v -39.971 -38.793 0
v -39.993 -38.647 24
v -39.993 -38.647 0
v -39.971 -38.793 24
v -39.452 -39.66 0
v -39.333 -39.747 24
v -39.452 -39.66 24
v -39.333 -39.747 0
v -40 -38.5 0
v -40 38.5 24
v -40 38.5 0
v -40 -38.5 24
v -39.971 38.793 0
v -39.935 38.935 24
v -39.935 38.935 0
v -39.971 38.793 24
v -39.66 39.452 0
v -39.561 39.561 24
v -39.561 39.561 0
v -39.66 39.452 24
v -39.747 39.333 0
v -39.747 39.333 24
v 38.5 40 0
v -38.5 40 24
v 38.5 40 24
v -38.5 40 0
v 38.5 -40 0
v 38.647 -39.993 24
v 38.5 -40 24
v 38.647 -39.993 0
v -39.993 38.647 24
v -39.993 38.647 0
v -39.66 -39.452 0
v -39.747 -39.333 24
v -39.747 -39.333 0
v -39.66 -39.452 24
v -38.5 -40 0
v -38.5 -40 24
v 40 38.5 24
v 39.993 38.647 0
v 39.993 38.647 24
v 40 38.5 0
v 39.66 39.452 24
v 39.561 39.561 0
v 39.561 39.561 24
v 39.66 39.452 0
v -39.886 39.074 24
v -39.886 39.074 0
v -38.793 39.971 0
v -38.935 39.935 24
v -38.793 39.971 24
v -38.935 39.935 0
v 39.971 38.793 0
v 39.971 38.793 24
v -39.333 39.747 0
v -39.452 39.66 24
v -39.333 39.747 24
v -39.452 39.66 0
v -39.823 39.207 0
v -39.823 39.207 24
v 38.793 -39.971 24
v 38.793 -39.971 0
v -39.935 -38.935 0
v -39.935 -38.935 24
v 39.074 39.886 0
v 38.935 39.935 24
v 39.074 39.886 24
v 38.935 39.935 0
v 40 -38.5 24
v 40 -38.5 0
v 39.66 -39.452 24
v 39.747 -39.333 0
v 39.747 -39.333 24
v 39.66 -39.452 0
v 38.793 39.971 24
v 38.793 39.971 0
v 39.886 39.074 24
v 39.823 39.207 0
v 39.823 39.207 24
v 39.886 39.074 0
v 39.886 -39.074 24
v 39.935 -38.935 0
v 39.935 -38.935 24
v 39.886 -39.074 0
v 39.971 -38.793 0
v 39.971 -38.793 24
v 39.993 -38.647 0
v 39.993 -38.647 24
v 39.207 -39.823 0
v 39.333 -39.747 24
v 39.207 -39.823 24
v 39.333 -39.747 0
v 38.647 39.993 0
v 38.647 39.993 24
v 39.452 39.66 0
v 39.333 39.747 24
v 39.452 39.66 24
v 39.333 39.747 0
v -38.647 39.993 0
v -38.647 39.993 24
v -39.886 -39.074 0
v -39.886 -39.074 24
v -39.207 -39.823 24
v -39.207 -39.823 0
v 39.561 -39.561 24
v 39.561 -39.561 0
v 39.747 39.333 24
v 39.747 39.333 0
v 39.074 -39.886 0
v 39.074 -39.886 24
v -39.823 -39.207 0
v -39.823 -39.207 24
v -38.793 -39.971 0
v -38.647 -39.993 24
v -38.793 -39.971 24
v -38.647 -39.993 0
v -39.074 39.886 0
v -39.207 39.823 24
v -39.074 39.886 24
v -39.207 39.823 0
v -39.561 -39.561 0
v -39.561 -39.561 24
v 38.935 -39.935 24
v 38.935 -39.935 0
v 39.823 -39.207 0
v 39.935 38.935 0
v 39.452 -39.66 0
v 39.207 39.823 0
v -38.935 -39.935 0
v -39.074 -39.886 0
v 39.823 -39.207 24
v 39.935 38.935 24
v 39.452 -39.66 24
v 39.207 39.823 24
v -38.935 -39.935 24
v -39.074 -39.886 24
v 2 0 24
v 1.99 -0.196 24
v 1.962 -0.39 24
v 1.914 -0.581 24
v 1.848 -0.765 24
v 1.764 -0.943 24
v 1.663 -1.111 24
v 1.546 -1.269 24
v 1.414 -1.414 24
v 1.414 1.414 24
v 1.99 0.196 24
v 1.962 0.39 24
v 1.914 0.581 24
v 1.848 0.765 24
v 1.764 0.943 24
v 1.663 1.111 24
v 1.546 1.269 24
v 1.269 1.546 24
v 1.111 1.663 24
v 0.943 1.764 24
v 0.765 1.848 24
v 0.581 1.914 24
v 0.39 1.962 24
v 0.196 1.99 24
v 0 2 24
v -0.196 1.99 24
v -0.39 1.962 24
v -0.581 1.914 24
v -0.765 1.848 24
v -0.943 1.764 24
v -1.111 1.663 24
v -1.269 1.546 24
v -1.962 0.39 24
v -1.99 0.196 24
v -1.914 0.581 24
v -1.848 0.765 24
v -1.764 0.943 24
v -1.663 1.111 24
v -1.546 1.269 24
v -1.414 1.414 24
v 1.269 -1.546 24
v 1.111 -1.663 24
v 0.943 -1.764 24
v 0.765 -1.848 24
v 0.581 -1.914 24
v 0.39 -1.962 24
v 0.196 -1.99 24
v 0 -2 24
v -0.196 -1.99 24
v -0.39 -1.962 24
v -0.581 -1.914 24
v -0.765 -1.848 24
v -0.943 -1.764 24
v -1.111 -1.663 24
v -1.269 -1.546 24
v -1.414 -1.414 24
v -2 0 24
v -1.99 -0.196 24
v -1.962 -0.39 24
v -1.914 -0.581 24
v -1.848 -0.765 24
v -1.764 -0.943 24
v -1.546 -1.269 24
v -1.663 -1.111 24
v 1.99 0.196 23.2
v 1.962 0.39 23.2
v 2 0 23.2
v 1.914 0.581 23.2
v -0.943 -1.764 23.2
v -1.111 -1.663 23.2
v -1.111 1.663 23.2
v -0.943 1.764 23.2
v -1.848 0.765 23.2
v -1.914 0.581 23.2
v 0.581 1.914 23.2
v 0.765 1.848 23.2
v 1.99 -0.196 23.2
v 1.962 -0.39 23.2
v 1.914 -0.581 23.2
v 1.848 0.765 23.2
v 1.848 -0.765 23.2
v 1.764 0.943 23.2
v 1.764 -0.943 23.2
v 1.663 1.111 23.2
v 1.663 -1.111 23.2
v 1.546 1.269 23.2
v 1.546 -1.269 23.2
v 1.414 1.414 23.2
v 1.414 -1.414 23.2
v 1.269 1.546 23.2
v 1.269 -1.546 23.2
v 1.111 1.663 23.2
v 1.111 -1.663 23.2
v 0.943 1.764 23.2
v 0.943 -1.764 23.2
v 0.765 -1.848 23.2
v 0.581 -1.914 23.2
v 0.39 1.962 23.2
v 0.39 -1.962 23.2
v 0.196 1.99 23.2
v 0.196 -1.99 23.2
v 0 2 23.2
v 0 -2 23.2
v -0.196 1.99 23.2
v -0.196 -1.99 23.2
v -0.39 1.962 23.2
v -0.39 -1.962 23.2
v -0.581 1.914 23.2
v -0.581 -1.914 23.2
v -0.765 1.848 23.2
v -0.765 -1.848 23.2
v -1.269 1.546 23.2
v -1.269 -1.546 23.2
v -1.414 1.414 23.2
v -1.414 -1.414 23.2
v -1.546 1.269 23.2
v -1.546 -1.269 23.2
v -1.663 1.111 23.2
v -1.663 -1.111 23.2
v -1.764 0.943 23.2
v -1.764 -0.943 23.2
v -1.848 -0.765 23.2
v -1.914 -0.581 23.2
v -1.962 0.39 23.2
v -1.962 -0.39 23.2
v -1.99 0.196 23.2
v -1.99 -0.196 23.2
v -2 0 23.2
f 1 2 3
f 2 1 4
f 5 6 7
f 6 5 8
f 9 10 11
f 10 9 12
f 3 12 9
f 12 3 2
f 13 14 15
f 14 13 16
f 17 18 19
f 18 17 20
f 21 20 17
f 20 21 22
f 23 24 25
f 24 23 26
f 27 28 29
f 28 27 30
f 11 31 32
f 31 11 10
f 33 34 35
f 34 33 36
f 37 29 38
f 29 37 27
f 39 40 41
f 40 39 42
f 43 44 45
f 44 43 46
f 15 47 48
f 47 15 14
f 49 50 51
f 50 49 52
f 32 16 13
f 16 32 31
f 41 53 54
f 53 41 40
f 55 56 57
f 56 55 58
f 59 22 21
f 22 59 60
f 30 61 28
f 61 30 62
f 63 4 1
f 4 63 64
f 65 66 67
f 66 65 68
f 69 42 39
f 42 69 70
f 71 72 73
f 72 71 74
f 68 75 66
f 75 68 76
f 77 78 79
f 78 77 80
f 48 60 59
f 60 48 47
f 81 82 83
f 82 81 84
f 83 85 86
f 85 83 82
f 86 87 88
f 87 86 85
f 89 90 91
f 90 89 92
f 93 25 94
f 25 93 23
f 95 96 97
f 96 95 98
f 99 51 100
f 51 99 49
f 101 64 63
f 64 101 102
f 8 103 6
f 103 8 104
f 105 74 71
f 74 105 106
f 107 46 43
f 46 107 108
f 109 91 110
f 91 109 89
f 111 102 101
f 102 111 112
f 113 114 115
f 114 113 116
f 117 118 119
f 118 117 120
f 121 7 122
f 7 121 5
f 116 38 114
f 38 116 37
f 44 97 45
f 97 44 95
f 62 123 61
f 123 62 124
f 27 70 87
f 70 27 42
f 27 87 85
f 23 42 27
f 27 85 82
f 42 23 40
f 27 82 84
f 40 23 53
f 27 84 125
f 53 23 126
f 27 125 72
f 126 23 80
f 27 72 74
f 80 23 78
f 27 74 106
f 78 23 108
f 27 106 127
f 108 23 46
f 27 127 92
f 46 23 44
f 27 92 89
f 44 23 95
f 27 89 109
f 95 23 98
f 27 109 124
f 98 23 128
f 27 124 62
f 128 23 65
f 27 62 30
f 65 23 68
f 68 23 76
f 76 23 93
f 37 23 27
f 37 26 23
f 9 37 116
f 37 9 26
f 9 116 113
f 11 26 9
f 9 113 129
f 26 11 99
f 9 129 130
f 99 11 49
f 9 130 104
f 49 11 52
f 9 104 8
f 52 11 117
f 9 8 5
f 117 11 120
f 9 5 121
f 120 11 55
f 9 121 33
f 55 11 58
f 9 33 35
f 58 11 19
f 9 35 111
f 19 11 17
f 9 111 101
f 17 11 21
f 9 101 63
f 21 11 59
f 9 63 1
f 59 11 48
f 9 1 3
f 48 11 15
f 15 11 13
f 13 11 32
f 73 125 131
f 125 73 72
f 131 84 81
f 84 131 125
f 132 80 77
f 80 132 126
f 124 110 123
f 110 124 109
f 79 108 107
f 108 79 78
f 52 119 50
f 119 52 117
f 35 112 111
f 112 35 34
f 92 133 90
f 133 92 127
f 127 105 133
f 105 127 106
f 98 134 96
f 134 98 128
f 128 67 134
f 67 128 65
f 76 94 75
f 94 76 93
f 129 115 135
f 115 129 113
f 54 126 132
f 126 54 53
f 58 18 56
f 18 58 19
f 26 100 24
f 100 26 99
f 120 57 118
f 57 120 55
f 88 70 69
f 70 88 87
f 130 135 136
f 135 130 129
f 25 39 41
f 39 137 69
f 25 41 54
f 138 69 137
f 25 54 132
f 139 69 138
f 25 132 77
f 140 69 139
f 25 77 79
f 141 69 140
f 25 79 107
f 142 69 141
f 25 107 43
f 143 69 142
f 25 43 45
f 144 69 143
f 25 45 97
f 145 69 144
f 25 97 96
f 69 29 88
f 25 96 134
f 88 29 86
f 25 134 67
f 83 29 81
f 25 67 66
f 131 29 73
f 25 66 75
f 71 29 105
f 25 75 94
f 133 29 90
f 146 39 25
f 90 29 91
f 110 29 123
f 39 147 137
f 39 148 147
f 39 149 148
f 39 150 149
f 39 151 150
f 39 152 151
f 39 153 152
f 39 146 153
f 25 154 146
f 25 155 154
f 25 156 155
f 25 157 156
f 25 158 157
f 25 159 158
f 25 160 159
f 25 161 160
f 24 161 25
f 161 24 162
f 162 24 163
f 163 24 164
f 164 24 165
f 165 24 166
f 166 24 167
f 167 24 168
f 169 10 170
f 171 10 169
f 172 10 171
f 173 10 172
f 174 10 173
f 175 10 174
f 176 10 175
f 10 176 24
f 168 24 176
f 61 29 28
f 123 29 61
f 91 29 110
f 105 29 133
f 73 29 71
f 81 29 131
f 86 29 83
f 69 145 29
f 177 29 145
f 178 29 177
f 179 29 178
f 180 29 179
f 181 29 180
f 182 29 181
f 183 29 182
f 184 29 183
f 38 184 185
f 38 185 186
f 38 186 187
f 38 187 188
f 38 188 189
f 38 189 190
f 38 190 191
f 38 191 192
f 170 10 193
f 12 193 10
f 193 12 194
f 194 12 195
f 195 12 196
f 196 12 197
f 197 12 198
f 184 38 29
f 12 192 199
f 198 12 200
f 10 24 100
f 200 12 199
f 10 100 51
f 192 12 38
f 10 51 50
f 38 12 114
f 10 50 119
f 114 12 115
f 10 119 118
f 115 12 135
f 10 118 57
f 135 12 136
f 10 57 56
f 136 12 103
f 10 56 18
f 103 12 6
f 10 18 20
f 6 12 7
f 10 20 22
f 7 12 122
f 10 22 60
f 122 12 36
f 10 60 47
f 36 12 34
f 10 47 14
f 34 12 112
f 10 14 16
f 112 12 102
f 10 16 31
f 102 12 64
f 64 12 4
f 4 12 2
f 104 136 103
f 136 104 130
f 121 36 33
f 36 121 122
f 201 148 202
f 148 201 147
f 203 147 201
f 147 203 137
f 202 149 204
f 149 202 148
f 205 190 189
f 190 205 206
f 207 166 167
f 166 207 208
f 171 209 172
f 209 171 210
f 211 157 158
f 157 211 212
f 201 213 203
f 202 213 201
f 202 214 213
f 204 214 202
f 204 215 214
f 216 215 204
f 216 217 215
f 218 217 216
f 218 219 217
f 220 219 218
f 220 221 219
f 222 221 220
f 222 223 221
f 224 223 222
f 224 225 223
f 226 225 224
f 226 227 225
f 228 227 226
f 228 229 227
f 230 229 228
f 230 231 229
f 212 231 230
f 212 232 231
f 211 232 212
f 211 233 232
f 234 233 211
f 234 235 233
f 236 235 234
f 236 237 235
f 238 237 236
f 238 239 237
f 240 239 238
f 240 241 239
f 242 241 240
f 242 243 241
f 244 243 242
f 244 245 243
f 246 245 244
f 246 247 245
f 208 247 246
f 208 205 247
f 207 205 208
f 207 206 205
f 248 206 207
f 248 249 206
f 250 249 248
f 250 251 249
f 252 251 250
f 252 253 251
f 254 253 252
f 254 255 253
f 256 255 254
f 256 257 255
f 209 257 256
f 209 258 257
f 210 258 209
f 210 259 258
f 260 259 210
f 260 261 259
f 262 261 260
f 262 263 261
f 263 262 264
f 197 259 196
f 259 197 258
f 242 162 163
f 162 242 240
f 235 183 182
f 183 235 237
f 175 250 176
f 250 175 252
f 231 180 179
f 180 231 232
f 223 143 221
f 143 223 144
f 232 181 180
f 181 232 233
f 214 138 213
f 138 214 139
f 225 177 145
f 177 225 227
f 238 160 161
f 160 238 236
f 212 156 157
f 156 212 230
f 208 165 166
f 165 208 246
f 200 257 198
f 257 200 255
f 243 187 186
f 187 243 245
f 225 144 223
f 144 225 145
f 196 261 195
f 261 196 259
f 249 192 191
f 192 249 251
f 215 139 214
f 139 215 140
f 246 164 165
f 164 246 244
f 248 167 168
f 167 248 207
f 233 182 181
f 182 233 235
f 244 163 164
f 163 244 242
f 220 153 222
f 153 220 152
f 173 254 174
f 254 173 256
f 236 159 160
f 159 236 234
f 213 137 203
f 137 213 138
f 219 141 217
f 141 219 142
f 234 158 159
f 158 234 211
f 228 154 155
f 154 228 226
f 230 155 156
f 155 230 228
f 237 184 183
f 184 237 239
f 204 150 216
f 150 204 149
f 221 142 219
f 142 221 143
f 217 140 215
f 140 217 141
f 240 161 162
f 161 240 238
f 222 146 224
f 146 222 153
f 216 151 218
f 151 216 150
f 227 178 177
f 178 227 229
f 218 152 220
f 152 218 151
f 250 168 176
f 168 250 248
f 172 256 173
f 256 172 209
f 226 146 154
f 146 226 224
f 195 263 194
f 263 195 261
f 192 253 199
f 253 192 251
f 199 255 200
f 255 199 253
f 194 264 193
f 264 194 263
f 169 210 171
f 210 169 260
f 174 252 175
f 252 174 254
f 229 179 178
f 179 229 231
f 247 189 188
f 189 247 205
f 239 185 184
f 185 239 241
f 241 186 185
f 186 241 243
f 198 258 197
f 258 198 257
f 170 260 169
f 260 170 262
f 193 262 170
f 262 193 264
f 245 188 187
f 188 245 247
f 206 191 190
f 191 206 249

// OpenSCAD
// BM-ISO-LG main body isolator pad, large stations
// J40 rubber recreation 3D model, units: millimetres.
// Generated by tools/generate_rubber_recreation_3d_models.py.
// OpenSCAD is the source model; export STL only after release parameters are set.

$fn = 64;

module rounded_rect_2d(size, r) {
  hull() {
    translate([-(size[0] / 2 - r), -(size[1] / 2 - r)]) circle(r = r);
    translate([ (size[0] / 2 - r), -(size[1] / 2 - r)]) circle(r = r);
    translate([ (size[0] / 2 - r),  (size[1] / 2 - r)]) circle(r = r);
    translate([-(size[0] / 2 - r),  (size[1] / 2 - r)]) circle(r = r);
  }
}

module capsule_2d(length, width) {
  hull() {
    translate([-(length - width) / 2, 0]) circle(d = width);
    translate([ (length - width) / 2, 0]) circle(d = width);
  }
}

// Current order basis:
// - Square solid pad 80 x 80 x 24.
// - hole_d defaults to 0 because the steel crush-sleeve OD is not released yet.
// - After sleeve measurement, set hole_d = sleeve_od + 0.5 to 1.0 mm.
// - Set center_mark = true for an undrilled pad with a shallow centre mark.

module bm_iso_lg_square_pad(
  pad_size = 80,
  pad_height = 24,
  corner_r = 1.5,
  edge_chamfer = 0.0,
  hole_d = 0,
  center_mark = true
) {
  difference() {
    linear_extrude(height = pad_height, center = false)
      rounded_rect_2d([pad_size, pad_size], corner_r);

    if (hole_d > 0)
      translate([0, 0, -1])
        cylinder(h = pad_height + 2, d = hole_d);

    if (hole_d == 0 && center_mark)
      translate([0, 0, pad_height - 0.8])
        cylinder(h = 1.0, d = 4.0);
  }
}

bm_iso_lg_square_pad();
